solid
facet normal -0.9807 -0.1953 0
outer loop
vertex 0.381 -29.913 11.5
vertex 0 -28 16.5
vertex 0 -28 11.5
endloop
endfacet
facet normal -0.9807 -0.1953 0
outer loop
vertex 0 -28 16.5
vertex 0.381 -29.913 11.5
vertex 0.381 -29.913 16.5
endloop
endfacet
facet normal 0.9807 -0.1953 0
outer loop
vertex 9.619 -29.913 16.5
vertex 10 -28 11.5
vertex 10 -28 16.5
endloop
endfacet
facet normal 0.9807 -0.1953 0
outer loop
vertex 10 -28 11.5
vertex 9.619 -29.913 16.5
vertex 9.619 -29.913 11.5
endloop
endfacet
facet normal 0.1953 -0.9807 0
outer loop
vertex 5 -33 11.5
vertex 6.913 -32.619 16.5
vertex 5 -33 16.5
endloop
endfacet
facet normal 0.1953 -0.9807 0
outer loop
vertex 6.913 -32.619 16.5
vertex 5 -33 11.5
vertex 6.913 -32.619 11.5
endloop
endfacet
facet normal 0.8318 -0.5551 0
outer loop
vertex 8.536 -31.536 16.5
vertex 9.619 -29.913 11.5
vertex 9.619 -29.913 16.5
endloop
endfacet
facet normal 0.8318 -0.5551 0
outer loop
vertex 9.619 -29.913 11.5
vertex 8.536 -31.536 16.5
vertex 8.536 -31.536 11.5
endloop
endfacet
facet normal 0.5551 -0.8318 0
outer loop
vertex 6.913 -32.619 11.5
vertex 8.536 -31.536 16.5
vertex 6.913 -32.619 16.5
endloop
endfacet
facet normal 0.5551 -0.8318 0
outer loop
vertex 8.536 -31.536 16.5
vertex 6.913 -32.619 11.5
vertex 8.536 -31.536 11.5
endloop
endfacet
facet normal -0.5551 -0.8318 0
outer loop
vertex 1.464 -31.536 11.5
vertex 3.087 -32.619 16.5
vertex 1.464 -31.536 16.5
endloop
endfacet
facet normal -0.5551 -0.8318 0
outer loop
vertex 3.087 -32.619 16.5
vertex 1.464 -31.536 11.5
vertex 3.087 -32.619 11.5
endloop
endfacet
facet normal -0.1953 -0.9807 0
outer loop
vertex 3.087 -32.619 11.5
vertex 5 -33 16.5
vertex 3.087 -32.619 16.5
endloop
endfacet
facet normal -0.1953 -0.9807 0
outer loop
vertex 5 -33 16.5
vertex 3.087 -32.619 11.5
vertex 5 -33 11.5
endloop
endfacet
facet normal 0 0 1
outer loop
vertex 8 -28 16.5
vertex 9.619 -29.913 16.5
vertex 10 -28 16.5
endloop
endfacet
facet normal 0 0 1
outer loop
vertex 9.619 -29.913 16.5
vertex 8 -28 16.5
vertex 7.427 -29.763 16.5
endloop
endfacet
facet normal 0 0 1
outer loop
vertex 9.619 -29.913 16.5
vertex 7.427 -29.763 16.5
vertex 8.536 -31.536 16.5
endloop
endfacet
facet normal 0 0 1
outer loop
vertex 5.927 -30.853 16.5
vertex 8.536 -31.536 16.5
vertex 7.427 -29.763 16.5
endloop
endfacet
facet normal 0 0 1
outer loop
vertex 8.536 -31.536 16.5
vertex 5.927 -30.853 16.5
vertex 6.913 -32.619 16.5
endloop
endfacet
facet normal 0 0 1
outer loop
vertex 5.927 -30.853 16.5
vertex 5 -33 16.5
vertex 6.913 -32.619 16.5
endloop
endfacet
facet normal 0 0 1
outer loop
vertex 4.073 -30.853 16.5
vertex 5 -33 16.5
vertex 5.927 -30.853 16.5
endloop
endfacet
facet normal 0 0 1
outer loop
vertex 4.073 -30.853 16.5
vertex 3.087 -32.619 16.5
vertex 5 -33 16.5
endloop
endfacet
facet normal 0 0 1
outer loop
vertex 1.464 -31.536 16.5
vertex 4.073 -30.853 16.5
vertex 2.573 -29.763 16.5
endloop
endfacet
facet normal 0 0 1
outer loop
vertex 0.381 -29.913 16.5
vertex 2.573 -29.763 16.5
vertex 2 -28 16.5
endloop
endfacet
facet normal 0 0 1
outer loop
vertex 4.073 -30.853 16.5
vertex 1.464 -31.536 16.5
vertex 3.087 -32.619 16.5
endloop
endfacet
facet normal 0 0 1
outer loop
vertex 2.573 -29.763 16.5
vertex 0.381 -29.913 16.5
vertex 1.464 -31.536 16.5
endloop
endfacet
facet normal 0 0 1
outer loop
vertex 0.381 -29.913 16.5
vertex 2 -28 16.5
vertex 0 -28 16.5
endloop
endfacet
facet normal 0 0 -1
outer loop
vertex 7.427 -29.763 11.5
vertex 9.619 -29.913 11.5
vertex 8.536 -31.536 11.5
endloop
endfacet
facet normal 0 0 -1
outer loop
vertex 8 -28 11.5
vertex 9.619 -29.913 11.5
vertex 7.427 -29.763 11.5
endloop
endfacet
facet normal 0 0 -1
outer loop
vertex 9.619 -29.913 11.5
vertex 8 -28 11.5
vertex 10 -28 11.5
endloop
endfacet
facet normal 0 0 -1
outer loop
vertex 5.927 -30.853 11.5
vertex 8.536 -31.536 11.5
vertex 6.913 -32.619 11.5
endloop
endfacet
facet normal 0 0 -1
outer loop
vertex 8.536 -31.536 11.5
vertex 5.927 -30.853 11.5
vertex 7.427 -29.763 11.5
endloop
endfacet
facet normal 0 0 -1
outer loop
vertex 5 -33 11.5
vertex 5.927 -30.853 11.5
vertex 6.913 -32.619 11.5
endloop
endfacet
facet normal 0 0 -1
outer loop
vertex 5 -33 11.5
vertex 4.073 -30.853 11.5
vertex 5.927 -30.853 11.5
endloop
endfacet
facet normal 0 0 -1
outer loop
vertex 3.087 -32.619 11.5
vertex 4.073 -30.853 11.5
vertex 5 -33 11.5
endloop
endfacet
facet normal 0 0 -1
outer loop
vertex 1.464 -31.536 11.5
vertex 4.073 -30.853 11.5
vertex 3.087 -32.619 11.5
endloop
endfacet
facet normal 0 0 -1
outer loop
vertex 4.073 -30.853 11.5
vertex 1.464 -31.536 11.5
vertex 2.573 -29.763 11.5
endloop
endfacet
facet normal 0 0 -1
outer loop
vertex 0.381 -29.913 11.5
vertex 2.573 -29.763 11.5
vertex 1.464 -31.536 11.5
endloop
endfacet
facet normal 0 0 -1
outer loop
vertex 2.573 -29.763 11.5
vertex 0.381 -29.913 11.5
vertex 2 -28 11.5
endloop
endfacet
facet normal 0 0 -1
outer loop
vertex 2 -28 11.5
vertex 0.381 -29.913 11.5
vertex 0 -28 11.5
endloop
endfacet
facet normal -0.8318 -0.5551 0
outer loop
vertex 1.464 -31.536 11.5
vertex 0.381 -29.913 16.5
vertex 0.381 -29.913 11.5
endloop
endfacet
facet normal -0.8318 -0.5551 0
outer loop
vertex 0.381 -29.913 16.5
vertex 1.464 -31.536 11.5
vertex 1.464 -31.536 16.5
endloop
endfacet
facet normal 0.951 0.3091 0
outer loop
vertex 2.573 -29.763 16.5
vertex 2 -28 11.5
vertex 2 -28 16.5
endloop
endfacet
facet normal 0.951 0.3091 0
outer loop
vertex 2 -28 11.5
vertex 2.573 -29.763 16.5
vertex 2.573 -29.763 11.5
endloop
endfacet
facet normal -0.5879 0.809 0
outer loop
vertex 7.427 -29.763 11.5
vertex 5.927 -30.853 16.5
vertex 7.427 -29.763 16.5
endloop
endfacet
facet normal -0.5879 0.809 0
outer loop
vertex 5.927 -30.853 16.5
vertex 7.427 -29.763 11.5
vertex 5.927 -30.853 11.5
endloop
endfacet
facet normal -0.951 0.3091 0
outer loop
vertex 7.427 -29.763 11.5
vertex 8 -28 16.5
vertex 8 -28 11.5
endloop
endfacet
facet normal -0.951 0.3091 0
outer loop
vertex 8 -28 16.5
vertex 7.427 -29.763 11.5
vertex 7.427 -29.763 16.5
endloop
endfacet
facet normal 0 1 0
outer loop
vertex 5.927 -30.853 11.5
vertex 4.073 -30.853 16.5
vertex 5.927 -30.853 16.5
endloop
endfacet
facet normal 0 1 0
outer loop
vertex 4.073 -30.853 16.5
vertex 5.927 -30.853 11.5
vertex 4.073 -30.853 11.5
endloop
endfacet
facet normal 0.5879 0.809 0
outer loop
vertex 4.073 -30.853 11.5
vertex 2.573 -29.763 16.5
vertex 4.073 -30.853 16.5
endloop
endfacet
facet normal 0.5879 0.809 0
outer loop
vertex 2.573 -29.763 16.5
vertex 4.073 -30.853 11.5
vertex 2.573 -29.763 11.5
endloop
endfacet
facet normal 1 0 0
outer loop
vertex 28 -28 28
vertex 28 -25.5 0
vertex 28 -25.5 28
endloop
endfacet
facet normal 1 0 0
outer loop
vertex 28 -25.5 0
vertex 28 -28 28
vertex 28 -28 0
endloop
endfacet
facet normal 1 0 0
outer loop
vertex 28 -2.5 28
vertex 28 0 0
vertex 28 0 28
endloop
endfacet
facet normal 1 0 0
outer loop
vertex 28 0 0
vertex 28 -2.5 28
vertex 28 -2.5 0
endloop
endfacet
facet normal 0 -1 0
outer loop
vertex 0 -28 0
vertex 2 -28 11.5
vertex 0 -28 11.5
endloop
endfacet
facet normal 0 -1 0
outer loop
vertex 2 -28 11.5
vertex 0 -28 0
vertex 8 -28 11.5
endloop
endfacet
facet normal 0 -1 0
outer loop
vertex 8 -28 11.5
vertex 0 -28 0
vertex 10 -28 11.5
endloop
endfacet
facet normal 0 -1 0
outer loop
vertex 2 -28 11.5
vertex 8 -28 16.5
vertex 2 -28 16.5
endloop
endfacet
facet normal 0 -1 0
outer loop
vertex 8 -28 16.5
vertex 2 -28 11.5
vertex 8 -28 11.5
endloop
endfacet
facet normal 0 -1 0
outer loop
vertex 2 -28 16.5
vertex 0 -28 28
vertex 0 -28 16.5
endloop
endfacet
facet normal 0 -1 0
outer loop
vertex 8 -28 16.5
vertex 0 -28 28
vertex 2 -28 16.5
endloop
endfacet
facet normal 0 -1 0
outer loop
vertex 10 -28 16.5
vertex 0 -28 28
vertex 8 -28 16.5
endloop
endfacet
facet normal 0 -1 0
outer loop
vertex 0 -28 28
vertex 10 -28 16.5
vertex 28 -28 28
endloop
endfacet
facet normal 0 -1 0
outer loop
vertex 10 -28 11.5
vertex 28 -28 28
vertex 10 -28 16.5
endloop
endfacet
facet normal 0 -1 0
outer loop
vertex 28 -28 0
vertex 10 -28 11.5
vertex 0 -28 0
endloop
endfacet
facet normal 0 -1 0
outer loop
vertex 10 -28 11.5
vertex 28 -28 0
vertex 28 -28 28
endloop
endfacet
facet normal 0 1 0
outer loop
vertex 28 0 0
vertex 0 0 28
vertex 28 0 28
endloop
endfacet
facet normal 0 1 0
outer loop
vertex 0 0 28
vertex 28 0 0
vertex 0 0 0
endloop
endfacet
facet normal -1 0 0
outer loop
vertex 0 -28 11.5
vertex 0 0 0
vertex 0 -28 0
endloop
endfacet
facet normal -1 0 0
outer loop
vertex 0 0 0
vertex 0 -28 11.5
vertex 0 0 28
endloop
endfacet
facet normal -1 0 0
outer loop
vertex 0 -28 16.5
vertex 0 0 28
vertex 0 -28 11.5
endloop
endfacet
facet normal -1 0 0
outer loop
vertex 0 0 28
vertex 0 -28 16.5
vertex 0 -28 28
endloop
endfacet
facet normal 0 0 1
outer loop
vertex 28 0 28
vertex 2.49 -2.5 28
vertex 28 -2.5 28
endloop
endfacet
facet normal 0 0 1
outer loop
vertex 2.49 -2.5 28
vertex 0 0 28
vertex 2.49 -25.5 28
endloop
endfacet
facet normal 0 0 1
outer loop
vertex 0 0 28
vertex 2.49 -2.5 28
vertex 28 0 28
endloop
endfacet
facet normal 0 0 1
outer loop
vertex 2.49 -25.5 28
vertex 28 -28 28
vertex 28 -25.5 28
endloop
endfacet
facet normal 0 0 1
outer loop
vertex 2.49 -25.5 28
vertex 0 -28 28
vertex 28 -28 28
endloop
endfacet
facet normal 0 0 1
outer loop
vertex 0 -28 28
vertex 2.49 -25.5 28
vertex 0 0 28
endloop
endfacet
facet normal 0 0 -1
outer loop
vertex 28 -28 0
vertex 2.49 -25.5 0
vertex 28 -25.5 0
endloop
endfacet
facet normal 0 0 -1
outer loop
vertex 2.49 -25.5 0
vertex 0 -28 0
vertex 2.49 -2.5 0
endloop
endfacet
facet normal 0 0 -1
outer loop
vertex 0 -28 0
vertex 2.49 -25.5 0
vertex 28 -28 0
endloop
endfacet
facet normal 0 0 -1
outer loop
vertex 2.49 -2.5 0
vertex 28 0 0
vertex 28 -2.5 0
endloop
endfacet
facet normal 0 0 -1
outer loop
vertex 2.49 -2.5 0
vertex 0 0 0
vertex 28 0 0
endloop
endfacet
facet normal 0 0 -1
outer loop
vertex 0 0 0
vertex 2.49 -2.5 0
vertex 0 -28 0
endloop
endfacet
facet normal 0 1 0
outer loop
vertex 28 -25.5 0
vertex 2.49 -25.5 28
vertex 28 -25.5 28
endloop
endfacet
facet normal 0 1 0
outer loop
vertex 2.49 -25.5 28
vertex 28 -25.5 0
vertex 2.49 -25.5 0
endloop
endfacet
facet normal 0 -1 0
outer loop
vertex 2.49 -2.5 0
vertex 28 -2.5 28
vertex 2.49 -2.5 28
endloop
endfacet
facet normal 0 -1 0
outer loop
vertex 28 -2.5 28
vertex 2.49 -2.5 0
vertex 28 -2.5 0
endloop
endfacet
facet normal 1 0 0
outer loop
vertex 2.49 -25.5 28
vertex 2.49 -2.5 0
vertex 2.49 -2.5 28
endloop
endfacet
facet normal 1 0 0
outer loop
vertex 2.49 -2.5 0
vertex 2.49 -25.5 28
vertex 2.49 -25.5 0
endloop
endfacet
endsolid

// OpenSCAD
// [FL_INDEX: keywords="openscad, 3d_parametric, Table_clip, csg_solid" | COT="Parametric OpenSCAD design from 3DCodeverse"]
// Title: Table clip

/* [Global] */
table_height = 23;
clipper_thickness = 5; 
hole_radius = 3;

/* [Hidden] */
printable = 1;
mo = 0.01;

rotate([printable?90:0,0,0])
clipper();

module clipper() {
	difference() {
		union(){
			cube(table_height + clipper_thickness);

			difference(){
				translate([hole_radius+2, (table_height + clipper_thickness*2  )/2, table_height + clipper_thickness])
				rotate([90,0,0])
					cylinder(h=clipper_thickness,r=hole_radius+2);

				translate([hole_radius+2, (table_height + clipper_thickness*2  )/2 +mo , table_height + clipper_thickness])
				rotate([90,0,0])
					cylinder(h=clipper_thickness+2*mo,r=hole_radius);
			}
		}


		translate([-mo+clipper_thickness/2,-mo,clipper_thickness/2])
			cube([table_height+clipper_thickness + 2*mo,table_height+clipper_thickness + 2*mo,table_height]);
	}
}
